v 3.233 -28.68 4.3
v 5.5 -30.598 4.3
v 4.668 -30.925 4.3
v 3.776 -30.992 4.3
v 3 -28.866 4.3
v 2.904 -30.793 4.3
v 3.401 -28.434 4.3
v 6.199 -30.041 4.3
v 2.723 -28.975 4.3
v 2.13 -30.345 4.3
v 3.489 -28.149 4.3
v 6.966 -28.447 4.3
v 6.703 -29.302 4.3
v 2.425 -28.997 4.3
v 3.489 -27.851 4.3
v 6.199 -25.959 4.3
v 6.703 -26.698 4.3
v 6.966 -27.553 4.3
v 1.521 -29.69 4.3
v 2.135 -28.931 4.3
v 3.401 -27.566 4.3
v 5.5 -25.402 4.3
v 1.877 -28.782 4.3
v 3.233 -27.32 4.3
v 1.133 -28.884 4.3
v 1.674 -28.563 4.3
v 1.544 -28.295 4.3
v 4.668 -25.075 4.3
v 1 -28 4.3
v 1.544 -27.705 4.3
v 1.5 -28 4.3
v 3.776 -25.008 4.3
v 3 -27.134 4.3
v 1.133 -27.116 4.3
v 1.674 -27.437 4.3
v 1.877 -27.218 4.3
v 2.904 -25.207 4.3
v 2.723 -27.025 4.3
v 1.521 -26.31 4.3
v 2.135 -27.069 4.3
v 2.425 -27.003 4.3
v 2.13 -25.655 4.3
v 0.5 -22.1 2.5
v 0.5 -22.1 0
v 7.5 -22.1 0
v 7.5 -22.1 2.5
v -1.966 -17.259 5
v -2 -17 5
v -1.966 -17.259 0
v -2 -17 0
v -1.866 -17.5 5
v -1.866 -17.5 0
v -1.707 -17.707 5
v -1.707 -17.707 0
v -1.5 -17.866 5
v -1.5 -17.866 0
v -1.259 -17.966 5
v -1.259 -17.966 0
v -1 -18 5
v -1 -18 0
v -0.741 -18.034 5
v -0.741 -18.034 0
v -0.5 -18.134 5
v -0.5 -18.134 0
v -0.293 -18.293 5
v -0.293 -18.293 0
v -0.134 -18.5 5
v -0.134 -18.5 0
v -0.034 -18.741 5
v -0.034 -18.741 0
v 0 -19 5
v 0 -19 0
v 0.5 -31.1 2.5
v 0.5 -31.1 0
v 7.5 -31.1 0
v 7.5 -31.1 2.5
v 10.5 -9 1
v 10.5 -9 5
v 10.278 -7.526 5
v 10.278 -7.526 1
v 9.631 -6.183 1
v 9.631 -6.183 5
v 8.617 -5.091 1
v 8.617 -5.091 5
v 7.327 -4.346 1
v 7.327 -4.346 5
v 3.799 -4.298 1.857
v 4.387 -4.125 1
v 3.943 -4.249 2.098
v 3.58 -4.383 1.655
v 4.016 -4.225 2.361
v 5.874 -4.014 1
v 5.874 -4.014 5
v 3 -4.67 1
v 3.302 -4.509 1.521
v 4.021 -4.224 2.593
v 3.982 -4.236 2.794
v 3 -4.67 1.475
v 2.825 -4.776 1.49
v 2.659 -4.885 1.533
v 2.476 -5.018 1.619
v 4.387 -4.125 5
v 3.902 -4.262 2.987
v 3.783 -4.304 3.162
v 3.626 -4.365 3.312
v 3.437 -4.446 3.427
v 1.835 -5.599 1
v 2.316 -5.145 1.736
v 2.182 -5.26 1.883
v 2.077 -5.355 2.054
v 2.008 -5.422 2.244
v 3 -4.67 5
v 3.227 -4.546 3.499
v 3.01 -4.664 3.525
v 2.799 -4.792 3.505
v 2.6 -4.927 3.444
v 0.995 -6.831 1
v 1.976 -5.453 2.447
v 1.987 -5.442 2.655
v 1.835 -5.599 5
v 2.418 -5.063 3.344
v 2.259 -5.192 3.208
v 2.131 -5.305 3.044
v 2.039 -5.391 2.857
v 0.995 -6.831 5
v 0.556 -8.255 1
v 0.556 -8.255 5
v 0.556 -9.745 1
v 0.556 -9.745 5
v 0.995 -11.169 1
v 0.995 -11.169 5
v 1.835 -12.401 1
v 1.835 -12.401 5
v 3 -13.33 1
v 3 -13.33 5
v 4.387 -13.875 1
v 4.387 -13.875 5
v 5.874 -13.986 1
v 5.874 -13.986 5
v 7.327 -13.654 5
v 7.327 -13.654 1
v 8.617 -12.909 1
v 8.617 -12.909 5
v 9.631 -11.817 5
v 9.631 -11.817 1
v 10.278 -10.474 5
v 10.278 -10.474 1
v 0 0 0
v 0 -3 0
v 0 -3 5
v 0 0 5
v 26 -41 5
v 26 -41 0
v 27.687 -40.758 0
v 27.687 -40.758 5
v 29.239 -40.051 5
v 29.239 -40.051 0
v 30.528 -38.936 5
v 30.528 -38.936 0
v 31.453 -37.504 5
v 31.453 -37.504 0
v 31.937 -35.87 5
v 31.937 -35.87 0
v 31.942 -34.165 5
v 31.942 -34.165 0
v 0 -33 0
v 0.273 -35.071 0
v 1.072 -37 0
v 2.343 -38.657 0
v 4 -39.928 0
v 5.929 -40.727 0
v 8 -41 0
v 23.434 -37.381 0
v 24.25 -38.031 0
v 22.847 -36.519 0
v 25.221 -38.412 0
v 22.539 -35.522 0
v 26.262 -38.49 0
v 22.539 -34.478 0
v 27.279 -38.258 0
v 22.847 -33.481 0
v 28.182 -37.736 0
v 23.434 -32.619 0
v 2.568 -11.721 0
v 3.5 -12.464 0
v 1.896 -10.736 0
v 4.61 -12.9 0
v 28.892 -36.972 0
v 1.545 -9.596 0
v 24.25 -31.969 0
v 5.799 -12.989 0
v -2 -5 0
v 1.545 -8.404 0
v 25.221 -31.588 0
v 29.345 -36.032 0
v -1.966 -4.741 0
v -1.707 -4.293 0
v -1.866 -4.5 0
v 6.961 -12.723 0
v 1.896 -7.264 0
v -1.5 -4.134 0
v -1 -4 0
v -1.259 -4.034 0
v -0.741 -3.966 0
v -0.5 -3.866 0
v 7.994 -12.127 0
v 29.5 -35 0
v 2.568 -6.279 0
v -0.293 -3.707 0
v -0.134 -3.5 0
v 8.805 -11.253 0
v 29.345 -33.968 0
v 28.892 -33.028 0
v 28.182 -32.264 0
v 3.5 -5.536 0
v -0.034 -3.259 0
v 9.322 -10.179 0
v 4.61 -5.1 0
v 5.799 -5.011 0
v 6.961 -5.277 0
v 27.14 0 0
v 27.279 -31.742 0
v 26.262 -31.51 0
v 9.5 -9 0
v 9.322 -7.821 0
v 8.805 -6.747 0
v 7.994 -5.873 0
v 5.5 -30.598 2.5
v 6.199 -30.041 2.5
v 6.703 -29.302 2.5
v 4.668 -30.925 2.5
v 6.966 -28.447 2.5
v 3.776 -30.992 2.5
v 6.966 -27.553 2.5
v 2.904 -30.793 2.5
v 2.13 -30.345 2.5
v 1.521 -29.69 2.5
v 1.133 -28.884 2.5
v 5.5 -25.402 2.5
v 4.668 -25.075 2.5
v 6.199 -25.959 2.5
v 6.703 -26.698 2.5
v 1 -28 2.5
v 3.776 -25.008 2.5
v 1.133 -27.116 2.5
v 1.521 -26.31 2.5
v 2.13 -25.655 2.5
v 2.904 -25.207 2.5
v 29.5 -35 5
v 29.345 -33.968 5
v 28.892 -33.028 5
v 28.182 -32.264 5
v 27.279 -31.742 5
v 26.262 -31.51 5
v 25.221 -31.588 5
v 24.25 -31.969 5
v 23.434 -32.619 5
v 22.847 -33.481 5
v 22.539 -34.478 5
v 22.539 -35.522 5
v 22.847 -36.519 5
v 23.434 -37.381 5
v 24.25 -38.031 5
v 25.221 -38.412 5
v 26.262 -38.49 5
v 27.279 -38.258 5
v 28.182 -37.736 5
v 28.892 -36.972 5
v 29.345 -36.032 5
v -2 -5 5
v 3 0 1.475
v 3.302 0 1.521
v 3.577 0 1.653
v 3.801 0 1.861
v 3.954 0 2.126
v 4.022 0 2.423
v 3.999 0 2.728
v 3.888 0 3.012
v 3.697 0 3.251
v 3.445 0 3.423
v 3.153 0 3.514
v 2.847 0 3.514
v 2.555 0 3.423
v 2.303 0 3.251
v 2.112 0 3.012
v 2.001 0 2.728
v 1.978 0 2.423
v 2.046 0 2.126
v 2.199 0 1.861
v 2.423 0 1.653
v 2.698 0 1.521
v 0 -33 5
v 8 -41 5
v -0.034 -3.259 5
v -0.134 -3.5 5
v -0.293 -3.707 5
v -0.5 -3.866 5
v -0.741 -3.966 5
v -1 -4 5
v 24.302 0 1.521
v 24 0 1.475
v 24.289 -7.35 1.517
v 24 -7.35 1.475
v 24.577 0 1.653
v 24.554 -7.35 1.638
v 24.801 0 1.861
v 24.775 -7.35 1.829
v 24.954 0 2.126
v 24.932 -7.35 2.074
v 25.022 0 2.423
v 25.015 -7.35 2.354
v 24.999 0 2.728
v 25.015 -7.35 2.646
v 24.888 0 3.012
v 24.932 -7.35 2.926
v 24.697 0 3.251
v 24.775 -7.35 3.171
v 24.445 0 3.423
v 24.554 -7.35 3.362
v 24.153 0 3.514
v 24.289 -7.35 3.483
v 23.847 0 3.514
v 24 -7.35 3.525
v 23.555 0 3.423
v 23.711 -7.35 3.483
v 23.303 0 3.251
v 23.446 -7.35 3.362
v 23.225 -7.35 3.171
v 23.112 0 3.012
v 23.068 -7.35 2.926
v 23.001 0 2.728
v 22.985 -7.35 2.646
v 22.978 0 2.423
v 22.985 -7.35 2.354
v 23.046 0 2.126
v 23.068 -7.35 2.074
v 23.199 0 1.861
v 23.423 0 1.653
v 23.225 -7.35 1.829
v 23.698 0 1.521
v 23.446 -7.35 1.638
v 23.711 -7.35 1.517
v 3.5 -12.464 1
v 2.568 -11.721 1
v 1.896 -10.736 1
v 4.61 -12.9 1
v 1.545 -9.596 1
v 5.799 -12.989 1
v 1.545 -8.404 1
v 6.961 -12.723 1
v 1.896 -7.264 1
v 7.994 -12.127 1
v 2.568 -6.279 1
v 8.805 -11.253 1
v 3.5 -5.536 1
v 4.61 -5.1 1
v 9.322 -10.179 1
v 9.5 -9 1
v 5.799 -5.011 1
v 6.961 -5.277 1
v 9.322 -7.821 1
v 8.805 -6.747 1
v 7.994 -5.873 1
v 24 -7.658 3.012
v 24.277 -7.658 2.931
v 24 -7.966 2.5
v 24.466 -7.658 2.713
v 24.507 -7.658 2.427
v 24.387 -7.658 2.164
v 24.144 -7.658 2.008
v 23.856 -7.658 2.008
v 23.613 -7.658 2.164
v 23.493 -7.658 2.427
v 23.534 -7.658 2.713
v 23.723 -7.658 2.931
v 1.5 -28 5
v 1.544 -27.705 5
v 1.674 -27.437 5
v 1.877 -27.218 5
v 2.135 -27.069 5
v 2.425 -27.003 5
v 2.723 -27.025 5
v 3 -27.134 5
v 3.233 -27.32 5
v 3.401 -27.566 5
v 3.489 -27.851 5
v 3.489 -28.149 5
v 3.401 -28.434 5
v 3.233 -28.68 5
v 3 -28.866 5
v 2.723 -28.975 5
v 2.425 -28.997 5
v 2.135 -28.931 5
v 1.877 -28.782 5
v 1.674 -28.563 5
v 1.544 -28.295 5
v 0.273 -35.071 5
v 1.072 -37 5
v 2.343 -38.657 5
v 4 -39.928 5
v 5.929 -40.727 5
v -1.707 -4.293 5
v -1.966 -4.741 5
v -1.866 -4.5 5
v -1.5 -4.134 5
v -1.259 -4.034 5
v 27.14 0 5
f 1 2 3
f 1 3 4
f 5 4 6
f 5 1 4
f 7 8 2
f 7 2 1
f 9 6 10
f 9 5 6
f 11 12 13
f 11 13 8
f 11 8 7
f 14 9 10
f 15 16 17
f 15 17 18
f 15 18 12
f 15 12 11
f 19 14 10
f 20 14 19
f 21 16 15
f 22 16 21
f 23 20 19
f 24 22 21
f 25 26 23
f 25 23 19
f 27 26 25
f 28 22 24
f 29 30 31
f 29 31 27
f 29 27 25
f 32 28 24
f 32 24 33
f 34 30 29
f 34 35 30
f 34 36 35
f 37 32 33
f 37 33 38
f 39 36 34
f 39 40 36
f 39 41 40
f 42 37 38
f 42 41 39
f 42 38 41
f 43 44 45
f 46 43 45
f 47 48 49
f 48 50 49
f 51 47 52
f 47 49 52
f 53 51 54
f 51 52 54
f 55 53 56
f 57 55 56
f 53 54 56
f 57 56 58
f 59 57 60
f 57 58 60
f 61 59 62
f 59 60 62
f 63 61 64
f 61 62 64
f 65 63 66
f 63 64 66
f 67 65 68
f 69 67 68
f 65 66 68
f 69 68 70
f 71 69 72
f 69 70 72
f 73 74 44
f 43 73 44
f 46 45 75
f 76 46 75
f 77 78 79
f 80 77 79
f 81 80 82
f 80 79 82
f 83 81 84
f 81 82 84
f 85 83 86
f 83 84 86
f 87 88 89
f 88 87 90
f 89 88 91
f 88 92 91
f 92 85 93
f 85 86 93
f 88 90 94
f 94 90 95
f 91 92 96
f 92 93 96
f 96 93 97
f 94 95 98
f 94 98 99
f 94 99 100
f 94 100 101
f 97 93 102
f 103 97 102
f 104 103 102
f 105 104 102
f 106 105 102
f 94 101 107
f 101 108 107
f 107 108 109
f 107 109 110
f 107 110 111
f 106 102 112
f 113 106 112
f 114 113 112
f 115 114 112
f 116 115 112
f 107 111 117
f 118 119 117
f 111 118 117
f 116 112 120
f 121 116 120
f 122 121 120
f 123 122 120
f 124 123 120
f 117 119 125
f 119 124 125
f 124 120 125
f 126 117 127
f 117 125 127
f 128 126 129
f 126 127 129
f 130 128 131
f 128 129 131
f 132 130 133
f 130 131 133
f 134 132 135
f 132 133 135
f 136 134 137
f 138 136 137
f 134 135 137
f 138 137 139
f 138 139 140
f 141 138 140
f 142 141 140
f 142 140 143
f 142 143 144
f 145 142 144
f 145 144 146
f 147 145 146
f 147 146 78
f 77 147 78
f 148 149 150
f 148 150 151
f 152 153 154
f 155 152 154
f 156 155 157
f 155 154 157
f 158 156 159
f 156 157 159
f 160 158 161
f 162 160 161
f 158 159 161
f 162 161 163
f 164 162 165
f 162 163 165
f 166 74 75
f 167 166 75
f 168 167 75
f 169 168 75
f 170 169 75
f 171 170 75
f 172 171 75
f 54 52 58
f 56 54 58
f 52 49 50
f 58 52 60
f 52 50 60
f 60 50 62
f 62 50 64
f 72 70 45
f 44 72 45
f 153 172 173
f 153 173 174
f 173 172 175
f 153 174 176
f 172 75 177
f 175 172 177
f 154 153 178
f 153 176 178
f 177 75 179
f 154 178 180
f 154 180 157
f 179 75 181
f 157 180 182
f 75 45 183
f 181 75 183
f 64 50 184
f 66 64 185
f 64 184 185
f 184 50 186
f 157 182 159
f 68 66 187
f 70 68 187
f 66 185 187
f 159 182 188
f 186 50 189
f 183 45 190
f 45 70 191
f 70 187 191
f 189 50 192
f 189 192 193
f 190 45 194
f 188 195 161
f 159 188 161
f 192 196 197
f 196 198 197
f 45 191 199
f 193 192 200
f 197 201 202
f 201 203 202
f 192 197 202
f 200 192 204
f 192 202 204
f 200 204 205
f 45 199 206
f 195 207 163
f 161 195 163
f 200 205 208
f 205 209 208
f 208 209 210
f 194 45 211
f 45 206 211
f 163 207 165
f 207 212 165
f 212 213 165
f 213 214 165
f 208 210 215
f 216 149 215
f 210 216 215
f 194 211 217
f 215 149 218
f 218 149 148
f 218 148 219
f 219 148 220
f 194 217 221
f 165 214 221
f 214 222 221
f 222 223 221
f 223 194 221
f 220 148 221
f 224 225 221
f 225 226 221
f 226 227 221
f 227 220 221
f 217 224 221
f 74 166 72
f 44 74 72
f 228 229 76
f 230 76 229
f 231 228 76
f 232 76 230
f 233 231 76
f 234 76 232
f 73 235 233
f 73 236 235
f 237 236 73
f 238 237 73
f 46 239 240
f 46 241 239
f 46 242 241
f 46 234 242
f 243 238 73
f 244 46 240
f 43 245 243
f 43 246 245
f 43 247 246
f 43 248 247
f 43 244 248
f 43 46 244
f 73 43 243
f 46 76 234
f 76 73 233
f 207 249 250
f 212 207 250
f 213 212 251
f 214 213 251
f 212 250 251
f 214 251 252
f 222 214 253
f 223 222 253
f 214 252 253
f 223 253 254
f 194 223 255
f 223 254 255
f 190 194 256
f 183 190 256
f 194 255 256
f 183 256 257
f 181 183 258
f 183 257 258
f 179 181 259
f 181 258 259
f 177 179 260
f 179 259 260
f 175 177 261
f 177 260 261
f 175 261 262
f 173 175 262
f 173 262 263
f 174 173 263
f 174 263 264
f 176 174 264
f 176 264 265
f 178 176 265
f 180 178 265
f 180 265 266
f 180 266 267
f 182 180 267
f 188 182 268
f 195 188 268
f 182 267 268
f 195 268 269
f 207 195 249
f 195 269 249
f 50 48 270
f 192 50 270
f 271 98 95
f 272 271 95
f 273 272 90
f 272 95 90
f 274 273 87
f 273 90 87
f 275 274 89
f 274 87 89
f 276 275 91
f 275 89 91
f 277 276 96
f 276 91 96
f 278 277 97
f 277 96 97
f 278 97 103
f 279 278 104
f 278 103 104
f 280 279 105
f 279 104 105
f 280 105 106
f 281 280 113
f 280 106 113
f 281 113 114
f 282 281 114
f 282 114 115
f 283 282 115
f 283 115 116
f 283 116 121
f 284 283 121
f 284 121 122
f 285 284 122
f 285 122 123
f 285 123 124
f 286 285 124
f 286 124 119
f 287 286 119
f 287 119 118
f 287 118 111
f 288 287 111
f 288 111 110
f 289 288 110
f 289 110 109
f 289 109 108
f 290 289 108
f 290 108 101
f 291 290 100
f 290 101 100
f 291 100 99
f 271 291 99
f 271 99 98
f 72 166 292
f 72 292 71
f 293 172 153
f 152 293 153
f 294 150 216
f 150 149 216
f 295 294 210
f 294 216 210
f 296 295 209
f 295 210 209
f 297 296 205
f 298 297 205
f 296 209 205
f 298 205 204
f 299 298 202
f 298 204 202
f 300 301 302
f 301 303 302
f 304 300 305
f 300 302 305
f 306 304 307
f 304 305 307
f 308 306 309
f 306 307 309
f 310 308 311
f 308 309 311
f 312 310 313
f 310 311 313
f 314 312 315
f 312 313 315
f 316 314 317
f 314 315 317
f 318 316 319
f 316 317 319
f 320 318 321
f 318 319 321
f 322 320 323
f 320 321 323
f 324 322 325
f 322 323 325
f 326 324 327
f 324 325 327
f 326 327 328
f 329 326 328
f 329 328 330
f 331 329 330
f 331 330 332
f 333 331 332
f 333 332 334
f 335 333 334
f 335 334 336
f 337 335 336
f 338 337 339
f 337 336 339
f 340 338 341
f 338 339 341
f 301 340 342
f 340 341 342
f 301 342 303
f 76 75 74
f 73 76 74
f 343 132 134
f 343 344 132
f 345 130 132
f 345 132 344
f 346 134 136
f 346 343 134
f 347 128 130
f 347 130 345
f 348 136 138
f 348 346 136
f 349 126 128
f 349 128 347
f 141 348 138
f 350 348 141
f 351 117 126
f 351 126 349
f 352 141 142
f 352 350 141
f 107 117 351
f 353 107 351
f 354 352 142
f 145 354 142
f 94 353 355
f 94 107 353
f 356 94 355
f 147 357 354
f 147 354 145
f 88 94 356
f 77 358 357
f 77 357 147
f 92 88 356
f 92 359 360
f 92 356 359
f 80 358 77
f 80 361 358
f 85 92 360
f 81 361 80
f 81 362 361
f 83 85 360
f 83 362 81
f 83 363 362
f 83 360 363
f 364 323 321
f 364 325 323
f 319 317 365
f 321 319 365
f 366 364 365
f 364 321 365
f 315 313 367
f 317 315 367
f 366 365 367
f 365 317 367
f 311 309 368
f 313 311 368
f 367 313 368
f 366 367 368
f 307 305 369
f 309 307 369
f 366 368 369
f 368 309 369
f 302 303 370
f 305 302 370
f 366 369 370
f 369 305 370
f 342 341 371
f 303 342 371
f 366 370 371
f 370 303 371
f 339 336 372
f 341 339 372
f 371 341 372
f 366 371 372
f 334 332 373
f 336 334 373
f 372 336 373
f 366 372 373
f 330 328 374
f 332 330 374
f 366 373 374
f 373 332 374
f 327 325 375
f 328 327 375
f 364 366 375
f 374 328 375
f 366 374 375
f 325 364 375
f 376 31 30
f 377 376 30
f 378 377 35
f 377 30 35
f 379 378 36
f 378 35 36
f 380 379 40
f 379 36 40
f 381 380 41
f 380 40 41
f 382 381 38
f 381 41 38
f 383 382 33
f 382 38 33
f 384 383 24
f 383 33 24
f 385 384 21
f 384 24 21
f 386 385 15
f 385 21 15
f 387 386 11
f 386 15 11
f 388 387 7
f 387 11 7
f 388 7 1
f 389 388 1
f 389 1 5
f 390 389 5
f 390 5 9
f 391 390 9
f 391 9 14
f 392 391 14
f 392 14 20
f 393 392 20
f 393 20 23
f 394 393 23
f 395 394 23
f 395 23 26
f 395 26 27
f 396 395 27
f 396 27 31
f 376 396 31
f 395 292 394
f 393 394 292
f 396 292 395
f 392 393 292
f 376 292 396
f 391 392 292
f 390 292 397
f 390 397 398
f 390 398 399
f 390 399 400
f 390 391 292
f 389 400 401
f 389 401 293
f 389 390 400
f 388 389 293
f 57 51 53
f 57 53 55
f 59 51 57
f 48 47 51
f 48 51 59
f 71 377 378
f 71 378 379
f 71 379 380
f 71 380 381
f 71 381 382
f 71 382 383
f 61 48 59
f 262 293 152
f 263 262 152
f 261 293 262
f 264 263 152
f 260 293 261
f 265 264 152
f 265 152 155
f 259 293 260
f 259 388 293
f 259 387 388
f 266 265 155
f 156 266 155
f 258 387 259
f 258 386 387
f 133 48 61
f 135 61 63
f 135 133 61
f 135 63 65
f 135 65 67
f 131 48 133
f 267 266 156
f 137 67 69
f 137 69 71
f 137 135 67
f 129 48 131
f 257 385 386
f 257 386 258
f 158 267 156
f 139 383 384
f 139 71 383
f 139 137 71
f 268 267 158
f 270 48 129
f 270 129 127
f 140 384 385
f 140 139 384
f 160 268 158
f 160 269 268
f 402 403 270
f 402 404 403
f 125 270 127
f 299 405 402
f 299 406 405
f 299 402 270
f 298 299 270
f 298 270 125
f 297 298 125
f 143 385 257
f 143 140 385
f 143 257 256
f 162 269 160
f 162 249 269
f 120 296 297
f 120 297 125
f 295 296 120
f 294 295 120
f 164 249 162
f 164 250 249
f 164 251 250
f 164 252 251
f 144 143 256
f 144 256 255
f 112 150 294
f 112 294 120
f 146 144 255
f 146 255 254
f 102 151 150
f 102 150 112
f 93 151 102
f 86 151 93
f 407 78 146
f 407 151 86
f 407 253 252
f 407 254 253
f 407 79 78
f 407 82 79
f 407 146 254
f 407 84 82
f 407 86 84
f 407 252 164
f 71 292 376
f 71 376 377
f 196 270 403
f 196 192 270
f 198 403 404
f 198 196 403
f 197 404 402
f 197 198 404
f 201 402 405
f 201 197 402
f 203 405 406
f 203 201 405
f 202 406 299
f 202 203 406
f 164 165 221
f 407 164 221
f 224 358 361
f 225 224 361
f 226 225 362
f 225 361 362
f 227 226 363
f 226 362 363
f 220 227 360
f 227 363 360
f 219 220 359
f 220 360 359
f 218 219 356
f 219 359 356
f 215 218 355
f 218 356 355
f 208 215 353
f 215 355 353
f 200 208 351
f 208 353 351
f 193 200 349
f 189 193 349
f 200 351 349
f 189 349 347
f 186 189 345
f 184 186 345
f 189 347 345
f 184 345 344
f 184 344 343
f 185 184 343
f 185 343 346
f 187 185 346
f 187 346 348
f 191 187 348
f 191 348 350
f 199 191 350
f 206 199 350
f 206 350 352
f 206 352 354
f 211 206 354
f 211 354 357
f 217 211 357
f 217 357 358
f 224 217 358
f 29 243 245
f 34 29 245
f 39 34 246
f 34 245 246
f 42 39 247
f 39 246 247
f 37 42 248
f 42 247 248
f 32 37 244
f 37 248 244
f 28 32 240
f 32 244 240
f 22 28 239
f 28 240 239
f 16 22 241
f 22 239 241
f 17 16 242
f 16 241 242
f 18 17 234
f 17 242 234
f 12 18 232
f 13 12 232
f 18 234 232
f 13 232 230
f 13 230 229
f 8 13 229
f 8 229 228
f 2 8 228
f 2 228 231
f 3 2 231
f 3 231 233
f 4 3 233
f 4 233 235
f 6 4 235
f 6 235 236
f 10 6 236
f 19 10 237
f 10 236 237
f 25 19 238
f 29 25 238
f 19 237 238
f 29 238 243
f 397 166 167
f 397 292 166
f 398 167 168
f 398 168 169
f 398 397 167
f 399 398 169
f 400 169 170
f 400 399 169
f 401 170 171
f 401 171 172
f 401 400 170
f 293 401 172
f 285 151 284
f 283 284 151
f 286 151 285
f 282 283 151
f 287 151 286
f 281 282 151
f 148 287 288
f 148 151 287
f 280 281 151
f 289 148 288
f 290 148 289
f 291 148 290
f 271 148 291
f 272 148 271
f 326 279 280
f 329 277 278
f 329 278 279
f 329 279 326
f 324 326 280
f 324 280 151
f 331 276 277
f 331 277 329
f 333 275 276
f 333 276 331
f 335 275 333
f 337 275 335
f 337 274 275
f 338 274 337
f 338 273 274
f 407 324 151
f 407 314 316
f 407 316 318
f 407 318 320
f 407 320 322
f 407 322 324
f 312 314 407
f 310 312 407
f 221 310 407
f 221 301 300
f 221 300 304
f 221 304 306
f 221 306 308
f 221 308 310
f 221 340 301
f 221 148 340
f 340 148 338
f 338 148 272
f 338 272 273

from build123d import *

# Parameters (mm, degrees)
SKETCH_1_W               = 34
SKETCH_1_H               = 41
EXTRUDE_1_DEPTH          = 5
FILLET_1_R               = 8
SKETCH_2_R               = 3.5
CUT_EXTRUDE_2_DEPTH      = 5
SKETCH_3_R               = 4
CUT_EXTRUDE_3_DEPTH      = 5
SKETCH_4_R               = 5
CUT_EXTRUDE_4_DEPTH      = 4
HOLE_WIZARD_M2_5_1_D     = 2.05
HOLE_WIZARD_M2_5_1_DEPTH = 7.35
HOLE_WIZARD_M2_5_1_TIP   = 0.615882135
CUT_EXTRUDE_5_DEPTH      = 5
SKETCH_8_R               = 1
CUT_EXTRUDE_6_DEPTH      = 5
CUT_EXTRUDE_7_DEPTH      = 2.5
SKETCH_10_R              = 3
CUT_EXTRUDE_8_DEPTH      = 1.8
SKETCH_20_W              = 5
SKETCH_20_H              = 12
EXTRUDE_1_2_DEPTH        = 3
FILLET_2_R               = 1
CUT_EXTRUDE_1_DEPTH      = 10
SKETCH_26_W              = 2
SKETCH_26_H              = 14
EXTRUDE_2_DEPTH          = 5
FILLET_3_R               = 1
FILLET_4_R               = 1
FILLET_5_R               = 1
FILLET_6_R               = 1


with BuildPart() as part:
    # 草图1 → Extrude 1 (new body)
    with BuildSketch(Plane.XY):
        with Locations((17, -20.5)):
            Rectangle(SKETCH_1_W, SKETCH_1_H)
    extrude(amount=EXTRUDE_1_DEPTH)

    # 圆角1
    fillet_1_edges = [part.edges().sort_by_distance(p)[0] for p in [
        (0, -41, 2.5),
    ]]
    fillet(fillet_1_edges, radius=FILLET_1_R)

    # 草图2 → 拉伸2 (cut)
    with BuildSketch(Plane.XY.offset(5)):
        with Locations((26, -35)):
            Circle(SKETCH_2_R)
    extrude(amount=-CUT_EXTRUDE_2_DEPTH, mode=Mode.SUBTRACT)

    # 草图3 → 拉伸3 (cut)
    with BuildSketch(Plane.XY.offset(5)):
        with Locations((5.5, -9)):
            Circle(SKETCH_3_R)
    extrude(amount=-CUT_EXTRUDE_3_DEPTH, mode=Mode.SUBTRACT)

    # 草图4 → 拉伸4 (cut)
    with BuildSketch(Plane.XY.offset(5)):
        with Locations((5.5, -9)):
            Circle(SKETCH_4_R)
    extrude(amount=-CUT_EXTRUDE_4_DEPTH, mode=Mode.SUBTRACT)

    # M2.5 螺纹孔1
    with Locations(Plane(origin=(3, 0, 2.5), x_dir=(0, 0, 1), z_dir=(0, 1, 0))):
        with Locations((0, 0), (0, 21)):
            Hole(HOLE_WIZARD_M2_5_1_D / 2, depth=HOLE_WIZARD_M2_5_1_DEPTH)
            with Locations((0, 0, -(HOLE_WIZARD_M2_5_1_DEPTH + HOLE_WIZARD_M2_5_1_TIP / 2))):  # 118° drill point
                Cone(0, HOLE_WIZARD_M2_5_1_D / 2, HOLE_WIZARD_M2_5_1_TIP, mode=Mode.SUBTRACT)

    # 草图7 → 拉伸5 (cut)
    with BuildSketch(Plane(origin=(0, 0, 0), x_dir=(-1, 0, 0), z_dir=(0, 0, -1))):
        with BuildLine():
            Line((-31.941608412, -34.164961394), (-27.140036221, 0))
            Line((-27.140036221, 0), (-34, 0))
            Line((-34, 0), (-34, -41))
            Line((-34, -41), (-26, -41))
            ThreePointArc((-26, -41), (-30.528257481, -38.936354174), (-31.941608412, -34.164961394))
        make_face()
    extrude(amount=-CUT_EXTRUDE_5_DEPTH, mode=Mode.SUBTRACT)

    # 草图8 → 拉伸6 (cut)
    with BuildSketch(Plane(origin=(0, 0, 0), x_dir=(-1, 0, 0), z_dir=(0, 0, -1))):
        with Locations((-2.5, -28)):
            Circle(SKETCH_8_R)
    extrude(amount=-CUT_EXTRUDE_6_DEPTH, mode=Mode.SUBTRACT)

    # 草图9 → 拉伸7 (cut)
    with BuildSketch(Plane(origin=(0, 0, 0), x_dir=(-1, 0, 0), z_dir=(0, 0, -1))):
        Polygon((-7.1, -31.099737486), (-0.5, -31.099737486), (-0.5, -30.7), (-0.5, -23.5), (-0.5, -22.1), (-1.9, -22.1), (-6.1, -22.1), (-7.5, -22.1), (-7.5, -23.5), (-7.5, -30.7), (-7.5, -31.099737486), align=None)
    extrude(amount=-CUT_EXTRUDE_7_DEPTH, mode=Mode.SUBTRACT)

    # 草图10 → 拉伸8 (cut)
    with BuildSketch(Plane(origin=(0, 0, 2.5), x_dir=(-1, 0, 0), z_dir=(0, 0, -1))):
        with Locations((-4, -28)):
            Circle(SKETCH_10_R)
    extrude(amount=-CUT_EXTRUDE_8_DEPTH, mode=Mode.SUBTRACT)

    # 草图20 → Extrude 1 2 (add)
    with BuildSketch(Plane.ZY):
        with Locations((2.5, -11)):
            Rectangle(SKETCH_20_W, SKETCH_20_H)
    extrude(amount=EXTRUDE_1_2_DEPTH)

    # 圆角2
    fillet_2_edges = [part.edges().sort_by_distance(p)[0] for p in [
        (0, -17, 2.5),
        (0, -5, 2.5),
        (-3, -17, 2.5),
        (-3, -5, 2.5),
    ]]
    fillet(fillet_2_edges, radius=FILLET_2_R)

    # 草图25 → 切除-拉伸1 (cut)
    with BuildSketch(Plane.XY.offset(5)):
        Polygon((0, 0), (0, -20.48158168), (-11.543504156, -18.602913064), (-5.133928875, -2.100098549), align=None)
    extrude(amount=-CUT_EXTRUDE_1_DEPTH, mode=Mode.SUBTRACT)

    # 草图26 → 凸台-拉伸2 (add)
    with BuildSketch(Plane.XY.offset(5)):
        with Locations((-1, -11)):
            Rectangle(SKETCH_26_W, SKETCH_26_H)
    extrude(amount=-EXTRUDE_2_DEPTH)

    # 圆角3
    fillet_3_edges = [part.edges().sort_by_distance(p)[0] for p in [
        (0, -4, 2.5),
    ]]
    fillet(fillet_3_edges, radius=FILLET_3_R)

    # 圆角4
    fillet_4_edges = [part.edges().sort_by_distance(p)[0] for p in [
        (0, -18, 2.5),
    ]]
    fillet(fillet_4_edges, radius=FILLET_4_R)

    # 圆角5
    fillet_5_edges = [part.edges().sort_by_distance(p)[0] for p in [
        (-2, -4, 2.5),
    ]]
    fillet(fillet_5_edges, radius=FILLET_5_R - 0.0001)  # a hair under: the kernel refuses the full size

    # 圆角6
    fillet_6_edges = [part.edges().sort_by_distance(p)[0] for p in [
        (-2, -18, 2.5),
    ]]
    fillet(fillet_6_edges, radius=FILLET_6_R - 0.0001)  # a hair under: the kernel refuses the full size


solid = part.part
